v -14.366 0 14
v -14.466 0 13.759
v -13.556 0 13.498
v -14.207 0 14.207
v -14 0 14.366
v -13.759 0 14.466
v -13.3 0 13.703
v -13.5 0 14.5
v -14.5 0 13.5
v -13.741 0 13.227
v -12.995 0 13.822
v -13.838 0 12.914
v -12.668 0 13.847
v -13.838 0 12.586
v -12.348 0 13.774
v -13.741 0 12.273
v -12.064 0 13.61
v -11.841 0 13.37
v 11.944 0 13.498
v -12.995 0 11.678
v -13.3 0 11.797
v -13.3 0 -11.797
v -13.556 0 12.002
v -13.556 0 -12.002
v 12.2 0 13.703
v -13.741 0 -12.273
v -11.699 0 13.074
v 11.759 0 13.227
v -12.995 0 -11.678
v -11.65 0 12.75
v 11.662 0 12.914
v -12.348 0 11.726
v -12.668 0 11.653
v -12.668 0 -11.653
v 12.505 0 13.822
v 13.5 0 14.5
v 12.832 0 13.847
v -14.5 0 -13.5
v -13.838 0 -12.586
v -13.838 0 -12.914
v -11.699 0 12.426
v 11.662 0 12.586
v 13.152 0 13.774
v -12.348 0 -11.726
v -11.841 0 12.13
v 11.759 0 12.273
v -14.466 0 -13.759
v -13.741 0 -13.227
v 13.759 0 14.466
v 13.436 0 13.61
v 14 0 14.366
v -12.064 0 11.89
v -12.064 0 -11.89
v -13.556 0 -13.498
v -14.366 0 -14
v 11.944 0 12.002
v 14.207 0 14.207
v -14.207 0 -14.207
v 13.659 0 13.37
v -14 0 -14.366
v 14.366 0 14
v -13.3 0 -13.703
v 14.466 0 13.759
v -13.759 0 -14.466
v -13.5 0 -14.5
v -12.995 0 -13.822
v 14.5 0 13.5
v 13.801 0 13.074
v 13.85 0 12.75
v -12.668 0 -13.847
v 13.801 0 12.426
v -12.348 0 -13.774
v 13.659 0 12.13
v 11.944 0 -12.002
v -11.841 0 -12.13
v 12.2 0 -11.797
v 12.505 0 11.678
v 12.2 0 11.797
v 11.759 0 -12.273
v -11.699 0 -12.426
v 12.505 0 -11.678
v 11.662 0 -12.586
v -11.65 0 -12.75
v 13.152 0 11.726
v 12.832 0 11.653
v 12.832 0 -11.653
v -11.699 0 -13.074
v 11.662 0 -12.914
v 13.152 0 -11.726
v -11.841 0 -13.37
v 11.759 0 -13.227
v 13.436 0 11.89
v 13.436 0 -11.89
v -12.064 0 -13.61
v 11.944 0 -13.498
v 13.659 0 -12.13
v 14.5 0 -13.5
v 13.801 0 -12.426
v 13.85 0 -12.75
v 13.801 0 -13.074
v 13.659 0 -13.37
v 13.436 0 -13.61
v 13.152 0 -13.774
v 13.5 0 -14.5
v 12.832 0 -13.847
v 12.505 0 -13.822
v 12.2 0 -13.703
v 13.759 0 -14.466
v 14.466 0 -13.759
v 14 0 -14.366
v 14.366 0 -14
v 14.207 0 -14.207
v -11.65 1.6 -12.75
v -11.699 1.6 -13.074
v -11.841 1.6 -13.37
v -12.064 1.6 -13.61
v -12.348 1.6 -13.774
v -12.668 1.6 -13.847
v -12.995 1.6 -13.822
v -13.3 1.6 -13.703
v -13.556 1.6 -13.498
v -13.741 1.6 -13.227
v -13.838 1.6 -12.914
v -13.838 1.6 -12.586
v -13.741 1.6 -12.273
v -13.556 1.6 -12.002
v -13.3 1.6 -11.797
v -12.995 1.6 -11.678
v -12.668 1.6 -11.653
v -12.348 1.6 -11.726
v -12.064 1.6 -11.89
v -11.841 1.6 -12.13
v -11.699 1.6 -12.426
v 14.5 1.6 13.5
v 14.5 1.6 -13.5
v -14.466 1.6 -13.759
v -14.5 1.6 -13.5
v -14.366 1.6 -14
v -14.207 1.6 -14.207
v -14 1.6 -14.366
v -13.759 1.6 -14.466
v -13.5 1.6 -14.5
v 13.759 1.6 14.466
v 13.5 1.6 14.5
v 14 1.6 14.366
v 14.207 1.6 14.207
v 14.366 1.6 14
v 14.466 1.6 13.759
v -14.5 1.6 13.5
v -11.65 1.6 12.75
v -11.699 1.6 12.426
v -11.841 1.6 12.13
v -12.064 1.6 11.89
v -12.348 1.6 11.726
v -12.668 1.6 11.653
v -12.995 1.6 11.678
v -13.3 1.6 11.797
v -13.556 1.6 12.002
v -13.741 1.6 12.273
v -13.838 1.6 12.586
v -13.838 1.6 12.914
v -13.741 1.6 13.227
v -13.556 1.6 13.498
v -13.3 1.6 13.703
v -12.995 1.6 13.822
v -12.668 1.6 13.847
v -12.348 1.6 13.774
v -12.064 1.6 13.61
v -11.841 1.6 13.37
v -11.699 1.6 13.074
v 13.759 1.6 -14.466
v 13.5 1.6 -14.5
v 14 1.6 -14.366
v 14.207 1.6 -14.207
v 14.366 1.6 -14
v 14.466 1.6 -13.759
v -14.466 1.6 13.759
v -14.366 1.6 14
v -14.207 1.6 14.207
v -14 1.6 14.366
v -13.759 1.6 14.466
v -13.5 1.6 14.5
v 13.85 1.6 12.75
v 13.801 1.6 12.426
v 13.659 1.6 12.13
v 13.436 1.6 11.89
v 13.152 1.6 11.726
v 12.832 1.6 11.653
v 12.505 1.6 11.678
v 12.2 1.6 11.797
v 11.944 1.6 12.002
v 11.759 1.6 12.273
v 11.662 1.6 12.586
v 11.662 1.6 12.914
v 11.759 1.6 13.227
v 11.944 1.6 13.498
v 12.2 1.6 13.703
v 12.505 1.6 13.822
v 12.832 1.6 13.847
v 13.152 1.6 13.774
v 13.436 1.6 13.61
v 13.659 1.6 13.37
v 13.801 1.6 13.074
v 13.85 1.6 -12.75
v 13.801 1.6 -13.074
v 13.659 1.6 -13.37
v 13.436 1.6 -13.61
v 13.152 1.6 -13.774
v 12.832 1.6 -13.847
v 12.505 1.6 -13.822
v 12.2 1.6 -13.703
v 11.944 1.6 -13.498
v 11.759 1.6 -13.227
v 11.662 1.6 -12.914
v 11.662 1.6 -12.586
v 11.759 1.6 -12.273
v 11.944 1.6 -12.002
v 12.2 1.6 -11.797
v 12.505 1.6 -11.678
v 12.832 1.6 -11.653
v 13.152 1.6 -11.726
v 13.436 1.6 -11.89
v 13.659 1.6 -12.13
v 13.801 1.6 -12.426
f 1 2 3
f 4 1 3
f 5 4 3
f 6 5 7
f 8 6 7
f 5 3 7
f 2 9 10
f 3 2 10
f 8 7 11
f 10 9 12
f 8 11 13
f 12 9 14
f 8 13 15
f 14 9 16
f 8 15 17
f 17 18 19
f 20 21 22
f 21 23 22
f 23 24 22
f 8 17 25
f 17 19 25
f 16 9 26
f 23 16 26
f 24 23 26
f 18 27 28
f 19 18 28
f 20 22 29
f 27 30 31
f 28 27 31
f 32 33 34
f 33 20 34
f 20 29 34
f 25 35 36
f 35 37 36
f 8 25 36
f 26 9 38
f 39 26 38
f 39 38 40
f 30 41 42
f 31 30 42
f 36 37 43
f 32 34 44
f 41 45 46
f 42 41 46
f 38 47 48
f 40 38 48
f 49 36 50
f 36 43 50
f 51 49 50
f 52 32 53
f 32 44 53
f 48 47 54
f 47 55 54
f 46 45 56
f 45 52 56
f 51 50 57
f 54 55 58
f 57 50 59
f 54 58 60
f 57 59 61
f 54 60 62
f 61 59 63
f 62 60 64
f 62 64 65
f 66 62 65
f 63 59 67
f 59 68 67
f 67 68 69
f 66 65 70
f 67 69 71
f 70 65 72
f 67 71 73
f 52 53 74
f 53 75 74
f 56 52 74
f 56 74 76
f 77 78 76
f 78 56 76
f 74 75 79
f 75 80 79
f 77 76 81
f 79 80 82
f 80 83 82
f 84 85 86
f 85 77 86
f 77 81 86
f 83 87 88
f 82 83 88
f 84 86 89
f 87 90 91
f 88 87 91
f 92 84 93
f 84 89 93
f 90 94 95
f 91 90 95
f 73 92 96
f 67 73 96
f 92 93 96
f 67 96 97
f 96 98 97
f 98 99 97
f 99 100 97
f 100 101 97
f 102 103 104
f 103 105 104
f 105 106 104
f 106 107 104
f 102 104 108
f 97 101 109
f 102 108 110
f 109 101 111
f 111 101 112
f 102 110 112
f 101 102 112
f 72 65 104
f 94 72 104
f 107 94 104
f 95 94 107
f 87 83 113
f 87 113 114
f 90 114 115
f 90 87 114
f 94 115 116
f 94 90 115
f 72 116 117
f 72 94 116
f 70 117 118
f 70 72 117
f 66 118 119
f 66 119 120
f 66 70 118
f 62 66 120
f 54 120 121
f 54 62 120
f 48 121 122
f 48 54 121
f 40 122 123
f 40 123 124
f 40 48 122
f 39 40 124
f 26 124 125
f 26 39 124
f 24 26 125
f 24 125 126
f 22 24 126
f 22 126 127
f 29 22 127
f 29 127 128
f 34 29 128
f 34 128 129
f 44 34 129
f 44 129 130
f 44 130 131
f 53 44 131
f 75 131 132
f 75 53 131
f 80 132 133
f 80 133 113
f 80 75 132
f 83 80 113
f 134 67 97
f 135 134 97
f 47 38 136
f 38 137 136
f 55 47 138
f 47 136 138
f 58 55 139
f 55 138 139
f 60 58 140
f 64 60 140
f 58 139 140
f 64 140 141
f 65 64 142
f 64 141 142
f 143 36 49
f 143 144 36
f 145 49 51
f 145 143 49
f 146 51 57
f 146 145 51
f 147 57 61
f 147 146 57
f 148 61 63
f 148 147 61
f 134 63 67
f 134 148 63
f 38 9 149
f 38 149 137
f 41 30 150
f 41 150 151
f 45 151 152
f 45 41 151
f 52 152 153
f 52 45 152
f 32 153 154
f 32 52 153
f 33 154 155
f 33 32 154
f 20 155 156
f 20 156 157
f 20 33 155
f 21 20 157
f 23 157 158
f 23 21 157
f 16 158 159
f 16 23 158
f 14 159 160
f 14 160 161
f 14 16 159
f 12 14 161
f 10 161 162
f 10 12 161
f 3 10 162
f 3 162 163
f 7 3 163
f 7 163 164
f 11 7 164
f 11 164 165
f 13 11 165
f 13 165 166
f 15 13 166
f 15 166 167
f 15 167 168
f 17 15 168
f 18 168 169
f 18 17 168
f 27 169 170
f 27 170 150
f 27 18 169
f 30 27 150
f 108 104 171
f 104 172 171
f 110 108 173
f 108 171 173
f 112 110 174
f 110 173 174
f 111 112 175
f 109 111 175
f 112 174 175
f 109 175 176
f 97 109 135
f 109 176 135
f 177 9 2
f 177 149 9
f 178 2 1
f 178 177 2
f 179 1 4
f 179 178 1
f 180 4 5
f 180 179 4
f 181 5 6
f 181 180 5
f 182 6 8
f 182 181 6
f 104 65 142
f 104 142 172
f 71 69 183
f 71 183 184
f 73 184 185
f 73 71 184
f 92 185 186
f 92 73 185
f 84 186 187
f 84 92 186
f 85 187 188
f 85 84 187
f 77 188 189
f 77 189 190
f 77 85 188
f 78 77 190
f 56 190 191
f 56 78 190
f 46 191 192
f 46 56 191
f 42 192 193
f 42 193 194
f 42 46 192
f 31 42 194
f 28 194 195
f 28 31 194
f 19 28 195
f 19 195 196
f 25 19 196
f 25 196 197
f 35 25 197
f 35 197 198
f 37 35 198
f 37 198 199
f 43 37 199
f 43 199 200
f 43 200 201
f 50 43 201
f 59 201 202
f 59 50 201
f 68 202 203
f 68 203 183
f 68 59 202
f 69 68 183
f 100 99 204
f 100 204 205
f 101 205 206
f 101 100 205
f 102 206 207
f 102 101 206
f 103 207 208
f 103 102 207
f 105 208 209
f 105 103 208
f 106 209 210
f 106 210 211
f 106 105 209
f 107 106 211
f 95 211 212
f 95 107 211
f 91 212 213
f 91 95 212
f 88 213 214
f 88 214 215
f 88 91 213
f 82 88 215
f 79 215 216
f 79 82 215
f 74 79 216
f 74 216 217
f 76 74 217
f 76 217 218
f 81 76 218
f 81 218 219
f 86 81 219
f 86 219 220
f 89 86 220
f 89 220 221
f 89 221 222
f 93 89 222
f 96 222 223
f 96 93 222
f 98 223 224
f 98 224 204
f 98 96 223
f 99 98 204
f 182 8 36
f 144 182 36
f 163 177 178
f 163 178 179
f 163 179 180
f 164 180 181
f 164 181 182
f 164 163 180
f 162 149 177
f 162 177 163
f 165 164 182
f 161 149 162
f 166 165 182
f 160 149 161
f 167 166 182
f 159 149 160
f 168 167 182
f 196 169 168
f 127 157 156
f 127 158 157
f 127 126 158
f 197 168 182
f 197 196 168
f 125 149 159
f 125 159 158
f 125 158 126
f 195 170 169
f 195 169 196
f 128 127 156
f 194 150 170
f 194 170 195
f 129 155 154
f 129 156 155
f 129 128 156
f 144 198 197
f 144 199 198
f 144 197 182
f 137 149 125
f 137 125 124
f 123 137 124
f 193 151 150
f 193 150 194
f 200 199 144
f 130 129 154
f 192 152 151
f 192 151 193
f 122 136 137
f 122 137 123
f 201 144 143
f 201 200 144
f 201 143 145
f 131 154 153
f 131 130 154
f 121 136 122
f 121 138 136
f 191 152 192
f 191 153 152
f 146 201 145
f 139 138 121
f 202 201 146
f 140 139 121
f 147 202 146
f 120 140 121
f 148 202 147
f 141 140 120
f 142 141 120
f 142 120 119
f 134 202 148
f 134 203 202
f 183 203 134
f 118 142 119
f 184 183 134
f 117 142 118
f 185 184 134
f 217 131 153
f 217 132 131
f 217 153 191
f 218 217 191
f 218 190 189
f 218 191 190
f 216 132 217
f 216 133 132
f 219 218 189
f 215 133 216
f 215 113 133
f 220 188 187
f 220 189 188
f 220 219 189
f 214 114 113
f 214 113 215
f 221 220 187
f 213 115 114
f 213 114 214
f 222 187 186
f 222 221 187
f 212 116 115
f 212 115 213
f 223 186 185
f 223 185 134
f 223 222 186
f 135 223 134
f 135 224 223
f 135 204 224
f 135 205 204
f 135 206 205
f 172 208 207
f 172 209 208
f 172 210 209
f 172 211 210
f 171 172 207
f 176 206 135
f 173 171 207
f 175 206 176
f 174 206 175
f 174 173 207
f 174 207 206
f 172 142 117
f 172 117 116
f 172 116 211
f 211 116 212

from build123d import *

# Parameters (mm, degrees)
SKIZZE1_W                       = 29
SKIZZE1_H                       = 29
SKIZZE1_R                       = 1.1
AUFSATZ_LINEAR_AUSTRAGEN1_DEPTH = 1.6
VERRUNDUNG1_R                   = 1


with BuildPart() as part:
    # Skizze1 → Aufsatz-Linear austragen1 (new body)
    with BuildSketch(Plane(origin=(0, 0, 0), x_dir=(1, 0, 0), z_dir=(0, 1, 0))):
        Rectangle(SKIZZE1_W, SKIZZE1_H)
        with Locations((-12.75, 12.75)):
            Circle(SKIZZE1_R, mode=Mode.SUBTRACT)
        with Locations((12.75, 12.75)):
            Circle(SKIZZE1_R, mode=Mode.SUBTRACT)
        with Locations((12.75, -12.75)):
            Circle(SKIZZE1_R, mode=Mode.SUBTRACT)
        with Locations((-12.75, -12.75)):
            Circle(SKIZZE1_R, mode=Mode.SUBTRACT)
    extrude(amount=AUFSATZ_LINEAR_AUSTRAGEN1_DEPTH)

    # Verrundung1
    verrundung1_edges = [part.edges().sort_by_distance(p)[0] for p in [
        (14.5, 0.8, 14.5),
        (-14.5, 0.8, 14.5),
        (-14.5, 0.8, -14.5),
        (14.5, 0.8, -14.5),
    ]]
    fillet(verrundung1_edges, radius=VERRUNDUNG1_R)


solid = part.part
